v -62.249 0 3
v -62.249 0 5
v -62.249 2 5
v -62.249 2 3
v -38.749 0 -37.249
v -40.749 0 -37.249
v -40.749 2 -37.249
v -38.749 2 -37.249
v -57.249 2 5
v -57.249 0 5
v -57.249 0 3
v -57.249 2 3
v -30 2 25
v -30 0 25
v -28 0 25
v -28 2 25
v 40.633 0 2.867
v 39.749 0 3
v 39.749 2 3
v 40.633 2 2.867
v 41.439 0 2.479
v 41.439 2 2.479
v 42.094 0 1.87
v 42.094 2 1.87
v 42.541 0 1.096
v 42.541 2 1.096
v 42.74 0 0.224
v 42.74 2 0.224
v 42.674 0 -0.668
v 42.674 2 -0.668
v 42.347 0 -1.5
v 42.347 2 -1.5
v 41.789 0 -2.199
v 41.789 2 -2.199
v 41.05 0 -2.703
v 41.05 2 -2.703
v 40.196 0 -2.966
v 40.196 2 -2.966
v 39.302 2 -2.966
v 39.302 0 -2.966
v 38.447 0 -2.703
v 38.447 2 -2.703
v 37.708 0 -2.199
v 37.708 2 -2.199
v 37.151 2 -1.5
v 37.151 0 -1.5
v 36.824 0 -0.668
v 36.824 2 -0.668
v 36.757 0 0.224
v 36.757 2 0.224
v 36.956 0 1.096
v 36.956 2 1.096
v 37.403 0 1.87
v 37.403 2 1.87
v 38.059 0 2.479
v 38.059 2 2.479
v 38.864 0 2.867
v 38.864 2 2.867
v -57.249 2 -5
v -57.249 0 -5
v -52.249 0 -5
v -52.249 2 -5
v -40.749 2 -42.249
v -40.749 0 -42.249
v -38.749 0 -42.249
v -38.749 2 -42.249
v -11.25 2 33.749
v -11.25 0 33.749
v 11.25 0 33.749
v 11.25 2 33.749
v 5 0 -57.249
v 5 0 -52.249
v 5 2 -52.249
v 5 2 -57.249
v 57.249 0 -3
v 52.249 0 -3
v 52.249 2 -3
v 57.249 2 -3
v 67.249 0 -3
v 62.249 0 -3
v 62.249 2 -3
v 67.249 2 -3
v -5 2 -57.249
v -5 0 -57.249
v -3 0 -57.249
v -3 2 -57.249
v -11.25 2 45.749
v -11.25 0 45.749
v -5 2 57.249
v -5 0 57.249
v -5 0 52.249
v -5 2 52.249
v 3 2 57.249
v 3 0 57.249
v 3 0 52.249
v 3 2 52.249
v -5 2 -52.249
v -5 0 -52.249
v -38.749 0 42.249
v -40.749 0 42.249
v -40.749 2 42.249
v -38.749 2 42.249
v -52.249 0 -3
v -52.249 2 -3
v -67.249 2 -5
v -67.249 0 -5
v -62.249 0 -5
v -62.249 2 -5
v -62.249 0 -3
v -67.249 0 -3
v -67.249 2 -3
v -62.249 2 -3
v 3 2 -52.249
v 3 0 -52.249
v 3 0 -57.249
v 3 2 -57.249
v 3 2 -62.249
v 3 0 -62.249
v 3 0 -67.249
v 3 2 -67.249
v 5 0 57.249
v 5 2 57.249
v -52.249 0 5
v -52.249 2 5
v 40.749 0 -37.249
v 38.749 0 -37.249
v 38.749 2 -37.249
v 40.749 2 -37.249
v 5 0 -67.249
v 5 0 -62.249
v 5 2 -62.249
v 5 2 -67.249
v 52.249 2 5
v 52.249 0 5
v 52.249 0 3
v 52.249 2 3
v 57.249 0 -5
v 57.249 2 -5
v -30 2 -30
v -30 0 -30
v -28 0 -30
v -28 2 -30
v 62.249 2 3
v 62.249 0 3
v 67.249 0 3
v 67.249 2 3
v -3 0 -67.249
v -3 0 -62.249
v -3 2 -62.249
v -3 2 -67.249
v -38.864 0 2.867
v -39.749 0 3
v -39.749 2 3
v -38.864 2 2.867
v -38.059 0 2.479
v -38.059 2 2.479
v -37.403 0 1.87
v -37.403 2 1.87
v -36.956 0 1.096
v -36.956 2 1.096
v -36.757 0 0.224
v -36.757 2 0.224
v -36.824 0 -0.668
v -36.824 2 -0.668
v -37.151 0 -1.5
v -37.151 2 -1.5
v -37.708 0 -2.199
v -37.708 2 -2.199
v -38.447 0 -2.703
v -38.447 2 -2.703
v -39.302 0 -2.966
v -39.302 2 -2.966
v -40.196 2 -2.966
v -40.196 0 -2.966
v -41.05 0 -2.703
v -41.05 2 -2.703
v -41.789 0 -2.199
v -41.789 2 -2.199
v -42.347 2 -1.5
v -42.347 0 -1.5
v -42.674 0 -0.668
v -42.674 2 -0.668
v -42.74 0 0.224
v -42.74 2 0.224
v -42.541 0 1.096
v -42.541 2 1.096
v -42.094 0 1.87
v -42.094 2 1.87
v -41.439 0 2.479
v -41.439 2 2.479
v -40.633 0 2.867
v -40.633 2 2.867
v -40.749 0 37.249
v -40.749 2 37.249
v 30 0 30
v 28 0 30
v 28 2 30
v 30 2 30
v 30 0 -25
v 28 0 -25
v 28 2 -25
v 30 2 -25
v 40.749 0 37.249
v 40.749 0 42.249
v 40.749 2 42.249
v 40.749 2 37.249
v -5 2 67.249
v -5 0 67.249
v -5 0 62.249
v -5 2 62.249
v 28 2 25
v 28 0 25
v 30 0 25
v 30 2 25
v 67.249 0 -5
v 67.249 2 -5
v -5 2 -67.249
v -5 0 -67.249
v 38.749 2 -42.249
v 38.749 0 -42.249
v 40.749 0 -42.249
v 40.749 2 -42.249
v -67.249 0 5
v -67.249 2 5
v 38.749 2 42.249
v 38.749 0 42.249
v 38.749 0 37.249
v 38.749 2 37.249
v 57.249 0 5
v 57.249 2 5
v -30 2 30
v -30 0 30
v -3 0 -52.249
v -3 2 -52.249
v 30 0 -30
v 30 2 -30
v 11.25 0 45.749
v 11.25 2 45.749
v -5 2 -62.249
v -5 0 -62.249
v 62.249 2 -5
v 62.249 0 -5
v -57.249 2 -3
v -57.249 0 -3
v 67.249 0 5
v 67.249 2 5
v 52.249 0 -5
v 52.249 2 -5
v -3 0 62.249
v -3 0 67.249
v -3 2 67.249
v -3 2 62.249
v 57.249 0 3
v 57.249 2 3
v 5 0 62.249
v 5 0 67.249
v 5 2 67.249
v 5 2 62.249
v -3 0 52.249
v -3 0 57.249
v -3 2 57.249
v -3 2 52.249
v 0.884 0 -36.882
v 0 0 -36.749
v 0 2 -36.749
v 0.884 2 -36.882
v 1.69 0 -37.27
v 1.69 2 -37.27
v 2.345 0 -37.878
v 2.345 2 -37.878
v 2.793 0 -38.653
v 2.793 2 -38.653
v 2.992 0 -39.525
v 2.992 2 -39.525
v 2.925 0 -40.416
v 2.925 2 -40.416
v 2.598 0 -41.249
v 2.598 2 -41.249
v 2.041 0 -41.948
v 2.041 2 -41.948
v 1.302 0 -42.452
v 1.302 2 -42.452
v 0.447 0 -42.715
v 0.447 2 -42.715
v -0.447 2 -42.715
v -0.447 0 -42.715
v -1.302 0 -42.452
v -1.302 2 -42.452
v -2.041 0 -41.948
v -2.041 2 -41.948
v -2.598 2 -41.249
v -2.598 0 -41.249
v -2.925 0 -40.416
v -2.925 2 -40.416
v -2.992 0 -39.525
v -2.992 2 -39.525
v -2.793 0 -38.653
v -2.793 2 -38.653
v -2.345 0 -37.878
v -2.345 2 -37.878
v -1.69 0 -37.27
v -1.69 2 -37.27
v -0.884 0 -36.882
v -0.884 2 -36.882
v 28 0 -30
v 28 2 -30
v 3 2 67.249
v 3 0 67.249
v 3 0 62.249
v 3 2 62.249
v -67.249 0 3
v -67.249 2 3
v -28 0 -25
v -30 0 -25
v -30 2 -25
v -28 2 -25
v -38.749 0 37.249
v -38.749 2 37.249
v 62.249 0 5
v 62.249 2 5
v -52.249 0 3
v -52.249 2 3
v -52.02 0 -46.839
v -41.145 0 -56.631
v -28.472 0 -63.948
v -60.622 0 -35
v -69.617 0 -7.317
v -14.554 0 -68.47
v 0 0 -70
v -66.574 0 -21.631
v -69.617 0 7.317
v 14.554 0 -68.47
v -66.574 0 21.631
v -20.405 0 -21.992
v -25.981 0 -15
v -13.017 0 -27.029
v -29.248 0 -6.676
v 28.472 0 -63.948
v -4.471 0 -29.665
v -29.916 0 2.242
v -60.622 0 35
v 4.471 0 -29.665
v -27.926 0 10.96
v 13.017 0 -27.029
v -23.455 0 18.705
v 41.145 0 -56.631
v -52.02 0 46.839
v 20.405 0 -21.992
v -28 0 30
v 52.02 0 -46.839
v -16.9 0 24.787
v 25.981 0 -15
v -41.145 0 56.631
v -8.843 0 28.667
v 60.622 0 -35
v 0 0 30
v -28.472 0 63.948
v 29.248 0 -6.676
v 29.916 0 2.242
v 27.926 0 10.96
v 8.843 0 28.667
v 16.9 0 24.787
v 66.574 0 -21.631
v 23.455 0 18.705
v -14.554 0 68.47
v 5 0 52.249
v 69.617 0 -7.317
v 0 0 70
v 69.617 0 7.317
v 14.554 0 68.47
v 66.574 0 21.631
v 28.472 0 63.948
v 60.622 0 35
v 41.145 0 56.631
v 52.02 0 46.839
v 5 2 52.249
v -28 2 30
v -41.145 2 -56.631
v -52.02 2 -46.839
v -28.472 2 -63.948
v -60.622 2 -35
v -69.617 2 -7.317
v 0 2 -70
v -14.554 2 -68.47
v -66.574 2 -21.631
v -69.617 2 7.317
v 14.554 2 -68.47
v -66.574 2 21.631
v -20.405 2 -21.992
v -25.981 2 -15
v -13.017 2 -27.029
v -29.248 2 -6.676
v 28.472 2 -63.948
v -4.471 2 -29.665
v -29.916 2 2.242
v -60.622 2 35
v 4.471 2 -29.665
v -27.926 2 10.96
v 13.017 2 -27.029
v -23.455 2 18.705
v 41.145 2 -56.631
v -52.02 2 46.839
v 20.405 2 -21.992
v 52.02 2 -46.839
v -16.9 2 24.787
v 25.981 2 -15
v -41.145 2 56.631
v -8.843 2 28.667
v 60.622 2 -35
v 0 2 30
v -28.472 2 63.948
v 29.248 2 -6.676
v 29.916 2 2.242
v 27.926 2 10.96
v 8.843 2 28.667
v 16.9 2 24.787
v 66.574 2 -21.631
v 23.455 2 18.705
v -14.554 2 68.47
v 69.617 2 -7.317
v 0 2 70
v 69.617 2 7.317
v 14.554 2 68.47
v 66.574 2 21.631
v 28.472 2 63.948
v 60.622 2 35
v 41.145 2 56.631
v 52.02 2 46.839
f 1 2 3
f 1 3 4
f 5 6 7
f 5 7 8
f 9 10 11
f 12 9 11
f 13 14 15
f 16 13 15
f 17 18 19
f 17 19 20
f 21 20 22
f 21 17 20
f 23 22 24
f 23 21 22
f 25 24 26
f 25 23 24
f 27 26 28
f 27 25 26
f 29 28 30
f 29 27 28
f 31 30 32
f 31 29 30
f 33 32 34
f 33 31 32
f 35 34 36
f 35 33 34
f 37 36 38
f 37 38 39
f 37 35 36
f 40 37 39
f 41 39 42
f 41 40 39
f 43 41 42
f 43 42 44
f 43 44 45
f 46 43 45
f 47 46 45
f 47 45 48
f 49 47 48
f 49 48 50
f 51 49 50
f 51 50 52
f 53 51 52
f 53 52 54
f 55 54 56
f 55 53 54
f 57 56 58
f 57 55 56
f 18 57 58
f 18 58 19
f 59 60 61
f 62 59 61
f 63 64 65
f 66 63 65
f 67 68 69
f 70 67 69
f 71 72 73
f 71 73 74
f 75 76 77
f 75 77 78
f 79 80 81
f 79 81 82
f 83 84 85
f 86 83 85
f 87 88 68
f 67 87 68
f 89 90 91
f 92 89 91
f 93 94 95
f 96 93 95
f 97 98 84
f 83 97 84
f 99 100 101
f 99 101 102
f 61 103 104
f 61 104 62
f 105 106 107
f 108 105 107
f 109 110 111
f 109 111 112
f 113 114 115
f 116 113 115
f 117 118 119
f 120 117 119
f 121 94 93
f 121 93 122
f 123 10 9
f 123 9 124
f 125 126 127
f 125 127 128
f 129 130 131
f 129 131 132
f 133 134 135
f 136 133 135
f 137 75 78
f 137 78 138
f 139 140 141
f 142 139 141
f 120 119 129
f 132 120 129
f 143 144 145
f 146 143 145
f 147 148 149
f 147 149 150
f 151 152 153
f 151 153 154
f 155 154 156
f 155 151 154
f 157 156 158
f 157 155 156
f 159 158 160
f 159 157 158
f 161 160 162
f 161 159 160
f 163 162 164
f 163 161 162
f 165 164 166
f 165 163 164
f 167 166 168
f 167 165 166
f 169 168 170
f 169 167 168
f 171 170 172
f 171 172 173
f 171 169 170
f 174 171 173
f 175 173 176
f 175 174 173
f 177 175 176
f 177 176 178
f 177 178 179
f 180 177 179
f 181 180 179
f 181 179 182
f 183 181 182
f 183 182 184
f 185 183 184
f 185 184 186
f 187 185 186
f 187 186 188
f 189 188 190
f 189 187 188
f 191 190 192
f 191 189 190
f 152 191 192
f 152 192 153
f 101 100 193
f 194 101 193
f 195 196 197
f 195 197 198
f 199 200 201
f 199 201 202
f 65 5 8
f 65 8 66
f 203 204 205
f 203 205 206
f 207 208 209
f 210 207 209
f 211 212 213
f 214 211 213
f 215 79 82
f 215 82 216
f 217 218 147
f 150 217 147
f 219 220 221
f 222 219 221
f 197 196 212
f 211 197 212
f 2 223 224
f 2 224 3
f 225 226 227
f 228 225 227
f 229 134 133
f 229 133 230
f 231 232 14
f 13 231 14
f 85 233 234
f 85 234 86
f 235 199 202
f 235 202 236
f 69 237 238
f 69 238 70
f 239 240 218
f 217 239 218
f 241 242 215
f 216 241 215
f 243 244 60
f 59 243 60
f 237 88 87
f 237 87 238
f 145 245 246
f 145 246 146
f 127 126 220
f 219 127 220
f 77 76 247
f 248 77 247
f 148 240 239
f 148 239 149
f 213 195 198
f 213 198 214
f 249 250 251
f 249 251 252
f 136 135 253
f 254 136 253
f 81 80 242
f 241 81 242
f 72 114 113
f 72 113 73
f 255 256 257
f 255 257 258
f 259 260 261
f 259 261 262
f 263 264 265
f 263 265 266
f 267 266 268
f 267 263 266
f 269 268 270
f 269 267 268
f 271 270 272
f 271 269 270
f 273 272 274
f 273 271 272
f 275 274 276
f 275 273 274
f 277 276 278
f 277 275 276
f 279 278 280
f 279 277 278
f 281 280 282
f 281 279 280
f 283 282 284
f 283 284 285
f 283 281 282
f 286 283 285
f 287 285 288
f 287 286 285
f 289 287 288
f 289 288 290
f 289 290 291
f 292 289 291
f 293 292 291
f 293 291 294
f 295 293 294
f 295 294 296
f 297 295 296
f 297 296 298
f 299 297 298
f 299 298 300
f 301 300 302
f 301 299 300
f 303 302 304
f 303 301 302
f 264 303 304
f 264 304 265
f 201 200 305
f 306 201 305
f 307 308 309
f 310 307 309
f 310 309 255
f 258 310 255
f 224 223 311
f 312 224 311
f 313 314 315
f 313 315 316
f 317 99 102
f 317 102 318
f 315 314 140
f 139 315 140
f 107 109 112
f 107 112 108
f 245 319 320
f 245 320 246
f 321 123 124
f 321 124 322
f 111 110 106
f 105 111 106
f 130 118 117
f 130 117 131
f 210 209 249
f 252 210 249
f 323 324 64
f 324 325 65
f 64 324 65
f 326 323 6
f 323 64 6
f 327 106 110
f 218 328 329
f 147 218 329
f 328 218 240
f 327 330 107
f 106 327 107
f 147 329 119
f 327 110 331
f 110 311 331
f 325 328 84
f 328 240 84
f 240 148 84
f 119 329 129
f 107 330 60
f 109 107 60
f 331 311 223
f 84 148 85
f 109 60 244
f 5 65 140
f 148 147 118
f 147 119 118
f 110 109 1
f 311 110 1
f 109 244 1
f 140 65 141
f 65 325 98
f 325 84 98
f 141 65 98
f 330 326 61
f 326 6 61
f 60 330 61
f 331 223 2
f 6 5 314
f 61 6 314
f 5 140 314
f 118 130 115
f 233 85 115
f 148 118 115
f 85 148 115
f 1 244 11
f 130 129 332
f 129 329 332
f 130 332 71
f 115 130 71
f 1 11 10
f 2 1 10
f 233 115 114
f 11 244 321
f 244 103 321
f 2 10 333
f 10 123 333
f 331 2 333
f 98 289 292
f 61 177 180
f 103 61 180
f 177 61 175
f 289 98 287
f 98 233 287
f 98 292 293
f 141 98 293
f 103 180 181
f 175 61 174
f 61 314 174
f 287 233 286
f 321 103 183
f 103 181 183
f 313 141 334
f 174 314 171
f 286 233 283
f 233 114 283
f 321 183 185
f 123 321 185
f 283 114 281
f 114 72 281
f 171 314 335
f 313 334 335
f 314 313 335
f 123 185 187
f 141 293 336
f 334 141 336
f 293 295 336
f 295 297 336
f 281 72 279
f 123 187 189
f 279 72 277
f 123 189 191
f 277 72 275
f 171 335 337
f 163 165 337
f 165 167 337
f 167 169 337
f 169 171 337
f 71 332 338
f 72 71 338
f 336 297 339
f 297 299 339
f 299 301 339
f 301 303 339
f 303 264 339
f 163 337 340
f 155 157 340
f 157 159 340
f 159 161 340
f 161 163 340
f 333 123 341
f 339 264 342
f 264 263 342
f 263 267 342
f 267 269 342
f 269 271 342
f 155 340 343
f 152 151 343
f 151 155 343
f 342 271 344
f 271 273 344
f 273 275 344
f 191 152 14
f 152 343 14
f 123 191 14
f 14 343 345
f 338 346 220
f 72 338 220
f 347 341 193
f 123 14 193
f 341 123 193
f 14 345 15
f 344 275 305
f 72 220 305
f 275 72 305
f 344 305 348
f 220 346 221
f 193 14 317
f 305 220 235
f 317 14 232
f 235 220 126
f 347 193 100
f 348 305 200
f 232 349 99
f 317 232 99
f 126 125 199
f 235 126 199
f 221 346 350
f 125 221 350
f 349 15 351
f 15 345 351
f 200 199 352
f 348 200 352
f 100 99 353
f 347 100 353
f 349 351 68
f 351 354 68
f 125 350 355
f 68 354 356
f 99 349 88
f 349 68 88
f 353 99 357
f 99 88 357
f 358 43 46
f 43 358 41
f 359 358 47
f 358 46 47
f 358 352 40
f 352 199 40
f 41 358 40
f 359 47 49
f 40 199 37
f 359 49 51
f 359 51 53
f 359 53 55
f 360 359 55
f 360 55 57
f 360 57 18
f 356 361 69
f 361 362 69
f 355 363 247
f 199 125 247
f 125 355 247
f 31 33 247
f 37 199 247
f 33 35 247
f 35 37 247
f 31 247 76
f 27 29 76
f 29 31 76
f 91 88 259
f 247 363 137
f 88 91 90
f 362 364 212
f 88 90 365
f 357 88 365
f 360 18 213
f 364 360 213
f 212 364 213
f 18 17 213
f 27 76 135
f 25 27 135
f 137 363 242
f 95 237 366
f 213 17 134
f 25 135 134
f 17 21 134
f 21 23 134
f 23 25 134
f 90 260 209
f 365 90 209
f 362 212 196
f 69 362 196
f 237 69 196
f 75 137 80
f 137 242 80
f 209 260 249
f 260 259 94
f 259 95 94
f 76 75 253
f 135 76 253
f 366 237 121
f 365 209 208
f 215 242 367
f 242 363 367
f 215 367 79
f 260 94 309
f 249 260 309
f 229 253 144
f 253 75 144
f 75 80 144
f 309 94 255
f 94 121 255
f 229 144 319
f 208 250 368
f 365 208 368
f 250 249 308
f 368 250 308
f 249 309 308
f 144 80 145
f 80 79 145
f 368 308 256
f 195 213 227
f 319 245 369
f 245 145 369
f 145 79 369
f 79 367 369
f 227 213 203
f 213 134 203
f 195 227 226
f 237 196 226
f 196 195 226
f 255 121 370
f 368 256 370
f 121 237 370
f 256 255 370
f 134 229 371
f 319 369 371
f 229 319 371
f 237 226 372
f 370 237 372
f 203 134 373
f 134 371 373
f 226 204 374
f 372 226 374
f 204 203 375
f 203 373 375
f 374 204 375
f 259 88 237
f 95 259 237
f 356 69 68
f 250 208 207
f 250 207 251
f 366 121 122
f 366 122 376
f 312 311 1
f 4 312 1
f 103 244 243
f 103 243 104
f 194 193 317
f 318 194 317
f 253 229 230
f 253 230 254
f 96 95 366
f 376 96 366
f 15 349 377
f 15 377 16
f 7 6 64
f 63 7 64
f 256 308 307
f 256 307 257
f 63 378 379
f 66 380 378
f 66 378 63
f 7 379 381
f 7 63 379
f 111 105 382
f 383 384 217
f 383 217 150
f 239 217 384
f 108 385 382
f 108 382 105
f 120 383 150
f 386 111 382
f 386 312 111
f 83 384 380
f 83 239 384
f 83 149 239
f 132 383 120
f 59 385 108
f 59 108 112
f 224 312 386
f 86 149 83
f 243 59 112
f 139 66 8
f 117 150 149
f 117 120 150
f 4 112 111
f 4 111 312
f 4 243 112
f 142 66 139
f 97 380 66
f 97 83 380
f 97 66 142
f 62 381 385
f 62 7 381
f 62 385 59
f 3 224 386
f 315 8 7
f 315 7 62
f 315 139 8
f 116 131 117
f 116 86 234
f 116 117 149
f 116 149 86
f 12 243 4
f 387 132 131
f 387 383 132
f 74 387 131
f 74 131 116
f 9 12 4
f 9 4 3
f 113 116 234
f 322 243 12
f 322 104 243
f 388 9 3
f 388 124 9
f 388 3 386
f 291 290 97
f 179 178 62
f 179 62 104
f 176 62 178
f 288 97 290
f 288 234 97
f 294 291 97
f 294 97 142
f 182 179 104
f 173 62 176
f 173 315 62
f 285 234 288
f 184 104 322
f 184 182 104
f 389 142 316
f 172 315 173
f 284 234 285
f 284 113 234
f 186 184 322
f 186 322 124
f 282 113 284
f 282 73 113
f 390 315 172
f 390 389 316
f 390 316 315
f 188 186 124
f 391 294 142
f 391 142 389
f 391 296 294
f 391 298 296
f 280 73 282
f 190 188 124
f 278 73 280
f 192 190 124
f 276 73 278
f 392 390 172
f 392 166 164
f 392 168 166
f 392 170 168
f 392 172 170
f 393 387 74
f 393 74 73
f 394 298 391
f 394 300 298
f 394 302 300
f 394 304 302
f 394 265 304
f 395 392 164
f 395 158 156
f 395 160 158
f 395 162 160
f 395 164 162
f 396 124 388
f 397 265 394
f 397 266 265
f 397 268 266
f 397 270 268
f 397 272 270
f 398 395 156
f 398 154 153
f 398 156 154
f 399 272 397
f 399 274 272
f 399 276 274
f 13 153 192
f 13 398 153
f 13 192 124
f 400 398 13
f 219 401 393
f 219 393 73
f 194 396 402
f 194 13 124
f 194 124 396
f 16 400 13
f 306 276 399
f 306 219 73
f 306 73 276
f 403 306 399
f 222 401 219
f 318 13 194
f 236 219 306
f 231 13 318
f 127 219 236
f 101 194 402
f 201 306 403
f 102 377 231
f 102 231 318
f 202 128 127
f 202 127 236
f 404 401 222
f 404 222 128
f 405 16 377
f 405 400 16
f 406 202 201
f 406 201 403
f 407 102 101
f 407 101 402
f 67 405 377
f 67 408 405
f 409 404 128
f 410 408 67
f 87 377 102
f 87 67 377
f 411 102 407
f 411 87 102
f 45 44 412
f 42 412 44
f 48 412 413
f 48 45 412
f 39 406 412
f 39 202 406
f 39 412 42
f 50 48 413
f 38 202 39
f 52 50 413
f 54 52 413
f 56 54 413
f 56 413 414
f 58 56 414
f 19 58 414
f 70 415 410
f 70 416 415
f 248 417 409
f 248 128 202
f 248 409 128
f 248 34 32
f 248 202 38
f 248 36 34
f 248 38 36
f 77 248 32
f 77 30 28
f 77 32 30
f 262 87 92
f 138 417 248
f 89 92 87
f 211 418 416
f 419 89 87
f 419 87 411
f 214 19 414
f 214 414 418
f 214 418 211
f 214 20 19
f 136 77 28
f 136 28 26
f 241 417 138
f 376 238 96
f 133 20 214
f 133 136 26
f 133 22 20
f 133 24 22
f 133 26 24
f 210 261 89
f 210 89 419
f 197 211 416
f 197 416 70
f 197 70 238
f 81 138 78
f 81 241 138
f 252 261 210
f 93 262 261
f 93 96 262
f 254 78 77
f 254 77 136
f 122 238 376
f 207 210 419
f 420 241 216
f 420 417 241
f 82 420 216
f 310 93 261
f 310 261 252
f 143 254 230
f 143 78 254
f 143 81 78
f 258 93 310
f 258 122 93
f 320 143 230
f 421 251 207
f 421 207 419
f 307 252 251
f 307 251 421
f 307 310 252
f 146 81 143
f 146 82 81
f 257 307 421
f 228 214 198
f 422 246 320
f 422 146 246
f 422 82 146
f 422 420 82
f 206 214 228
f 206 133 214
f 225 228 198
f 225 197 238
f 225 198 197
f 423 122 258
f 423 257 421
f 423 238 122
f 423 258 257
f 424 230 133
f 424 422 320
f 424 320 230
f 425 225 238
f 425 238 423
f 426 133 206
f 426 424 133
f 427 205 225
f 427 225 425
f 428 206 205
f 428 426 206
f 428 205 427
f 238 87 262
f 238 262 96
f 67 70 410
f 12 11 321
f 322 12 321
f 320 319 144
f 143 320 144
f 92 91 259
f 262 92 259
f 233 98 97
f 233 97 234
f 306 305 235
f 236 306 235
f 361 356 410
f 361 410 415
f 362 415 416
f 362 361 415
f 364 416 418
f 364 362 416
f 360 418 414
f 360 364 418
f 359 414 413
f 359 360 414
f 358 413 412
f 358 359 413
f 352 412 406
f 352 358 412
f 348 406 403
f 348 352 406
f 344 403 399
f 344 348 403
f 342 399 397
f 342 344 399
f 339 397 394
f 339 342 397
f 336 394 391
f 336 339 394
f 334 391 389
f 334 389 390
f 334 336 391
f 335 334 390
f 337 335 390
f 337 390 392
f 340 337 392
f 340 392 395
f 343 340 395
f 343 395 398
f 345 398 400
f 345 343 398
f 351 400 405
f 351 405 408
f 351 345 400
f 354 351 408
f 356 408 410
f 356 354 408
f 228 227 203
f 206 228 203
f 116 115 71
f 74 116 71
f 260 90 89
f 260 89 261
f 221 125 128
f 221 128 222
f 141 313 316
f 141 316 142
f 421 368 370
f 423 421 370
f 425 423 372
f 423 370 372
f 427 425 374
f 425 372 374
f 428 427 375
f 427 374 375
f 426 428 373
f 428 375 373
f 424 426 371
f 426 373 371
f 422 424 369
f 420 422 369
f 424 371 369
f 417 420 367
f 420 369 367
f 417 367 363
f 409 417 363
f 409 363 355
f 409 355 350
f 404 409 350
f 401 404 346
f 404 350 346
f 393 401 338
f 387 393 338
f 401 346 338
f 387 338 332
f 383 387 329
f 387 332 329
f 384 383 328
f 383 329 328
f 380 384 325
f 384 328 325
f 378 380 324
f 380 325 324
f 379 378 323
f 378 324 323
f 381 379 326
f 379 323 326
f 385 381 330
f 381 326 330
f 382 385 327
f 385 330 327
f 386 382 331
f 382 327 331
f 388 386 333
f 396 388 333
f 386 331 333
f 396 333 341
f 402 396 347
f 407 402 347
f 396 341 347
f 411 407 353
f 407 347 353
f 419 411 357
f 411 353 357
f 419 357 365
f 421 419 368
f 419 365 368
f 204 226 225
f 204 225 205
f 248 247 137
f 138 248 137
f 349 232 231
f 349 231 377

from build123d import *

# Parameters (mm, degrees)
SKETCH1_R                   = 70
SKETCH1_R_2                 = 30
SKETCH1_R_3                 = 3
SKETCH1_W                   = 2
SKETCH1_H                   = 5
SKETCH1_W_2                 = 22.5
SKETCH1_H_2                 = 12
SKETCH1_W_3                 = 5
SKETCH1_H_3                 = 2
Y_KSEKLIK_EKSTR_ZYON1_DEPTH = 2


with BuildPart() as part:
    # Sketch1 → Yükseklik-Ekstrüzyon1 (new body)
    with BuildSketch(Plane(origin=(0, 0, 0), x_dir=(1, 0, 0), z_dir=(0, 1, 0))):
        with Locations(Location((0, 0, 0), (0, 0, 270))):
            Circle(SKETCH1_R)
        with Locations(Location((0, 0, 0), (0, 0, 270))):
            Circle(SKETCH1_R_2, mode=Mode.SUBTRACT)
        with Locations(Location((39.748737342, 0, 0), (0, 0, 270))):
            Circle(SKETCH1_R_3, mode=Mode.SUBTRACT)
        with Locations(Location((-39.748737342, 0, 0), (0, 0, 270))):
            Circle(SKETCH1_R_3, mode=Mode.SUBTRACT)
        with Locations(Location((0, 39.748737342, 0), (0, 0, 270))):
            Circle(SKETCH1_R_3, mode=Mode.SUBTRACT)
        with Locations((-29, 27.5)):
            Rectangle(SKETCH1_W, SKETCH1_H, mode=Mode.SUBTRACT)
        with Locations((29, 27.5)):
            Rectangle(SKETCH1_W, SKETCH1_H, mode=Mode.SUBTRACT)
        with Locations((-29, -27.5)):
            Rectangle(SKETCH1_W, SKETCH1_H, mode=Mode.SUBTRACT)
        with Locations((29, -27.5)):
            Rectangle(SKETCH1_W, SKETCH1_H, mode=Mode.SUBTRACT)
        with Locations((-39.748737342, 39.748737342)):
            Rectangle(SKETCH1_W, SKETCH1_H, mode=Mode.SUBTRACT)
        with Locations((39.748737342, 39.748737342)):
            Rectangle(SKETCH1_W, SKETCH1_H, mode=Mode.SUBTRACT)
        with Locations((39.748737342, -39.748737342)):
            Rectangle(SKETCH1_W, SKETCH1_H, mode=Mode.SUBTRACT)
        with Locations((-39.748737342, -39.748737342)):
            Rectangle(SKETCH1_W, SKETCH1_H, mode=Mode.SUBTRACT)
        with Locations((0, -39.748737342)):
            Rectangle(SKETCH1_W_2, SKETCH1_H_2, mode=Mode.SUBTRACT)
        with Locations((-64.748737342, 4)):
            Rectangle(SKETCH1_W_3, SKETCH1_H_3, mode=Mode.SUBTRACT)
        with Locations((-64.748737342, -4)):
            Rectangle(SKETCH1_W_3, SKETCH1_H_3, mode=Mode.SUBTRACT)
        with Locations((-54.748737342, -4)):
            Rectangle(SKETCH1_W_3, SKETCH1_H_3, mode=Mode.SUBTRACT)
        with Locations((-54.748737342, 4)):
            Rectangle(SKETCH1_W_3, SKETCH1_H_3, mode=Mode.SUBTRACT)
        with Locations((-4, 64.748737342)):
            Rectangle(SKETCH1_W, SKETCH1_H, mode=Mode.SUBTRACT)
        with Locations((-4, 54.748737342)):
            Rectangle(SKETCH1_W, SKETCH1_H, mode=Mode.SUBTRACT)
        with Locations((4, 54.748737342)):
            Rectangle(SKETCH1_W, SKETCH1_H, mode=Mode.SUBTRACT)
        with Locations((4, 64.748737342)):
            Rectangle(SKETCH1_W, SKETCH1_H, mode=Mode.SUBTRACT)
        with Locations((54.748737342, 4)):
            Rectangle(SKETCH1_W_3, SKETCH1_H_3, mode=Mode.SUBTRACT)
        with Locations((54.748737342, -4)):
            Rectangle(SKETCH1_W_3, SKETCH1_H_3, mode=Mode.SUBTRACT)
        with Locations((64.748737342, 4)):
            Rectangle(SKETCH1_W_3, SKETCH1_H_3, mode=Mode.SUBTRACT)
        with Locations((64.748737342, -4)):
            Rectangle(SKETCH1_W_3, SKETCH1_H_3, mode=Mode.SUBTRACT)
        with Locations((-4, -54.748737342)):
            Rectangle(SKETCH1_W, SKETCH1_H, mode=Mode.SUBTRACT)
        with Locations((4, -54.748737342)):
            Rectangle(SKETCH1_W, SKETCH1_H, mode=Mode.SUBTRACT)
        with Locations((4, -64.748737342)):
            Rectangle(SKETCH1_W, SKETCH1_H, mode=Mode.SUBTRACT)
        with Locations((-4, -64.748737342)):
            Rectangle(SKETCH1_W, SKETCH1_H, mode=Mode.SUBTRACT)
    extrude(amount=Y_KSEKLIK_EKSTR_ZYON1_DEPTH)


solid = part.part
